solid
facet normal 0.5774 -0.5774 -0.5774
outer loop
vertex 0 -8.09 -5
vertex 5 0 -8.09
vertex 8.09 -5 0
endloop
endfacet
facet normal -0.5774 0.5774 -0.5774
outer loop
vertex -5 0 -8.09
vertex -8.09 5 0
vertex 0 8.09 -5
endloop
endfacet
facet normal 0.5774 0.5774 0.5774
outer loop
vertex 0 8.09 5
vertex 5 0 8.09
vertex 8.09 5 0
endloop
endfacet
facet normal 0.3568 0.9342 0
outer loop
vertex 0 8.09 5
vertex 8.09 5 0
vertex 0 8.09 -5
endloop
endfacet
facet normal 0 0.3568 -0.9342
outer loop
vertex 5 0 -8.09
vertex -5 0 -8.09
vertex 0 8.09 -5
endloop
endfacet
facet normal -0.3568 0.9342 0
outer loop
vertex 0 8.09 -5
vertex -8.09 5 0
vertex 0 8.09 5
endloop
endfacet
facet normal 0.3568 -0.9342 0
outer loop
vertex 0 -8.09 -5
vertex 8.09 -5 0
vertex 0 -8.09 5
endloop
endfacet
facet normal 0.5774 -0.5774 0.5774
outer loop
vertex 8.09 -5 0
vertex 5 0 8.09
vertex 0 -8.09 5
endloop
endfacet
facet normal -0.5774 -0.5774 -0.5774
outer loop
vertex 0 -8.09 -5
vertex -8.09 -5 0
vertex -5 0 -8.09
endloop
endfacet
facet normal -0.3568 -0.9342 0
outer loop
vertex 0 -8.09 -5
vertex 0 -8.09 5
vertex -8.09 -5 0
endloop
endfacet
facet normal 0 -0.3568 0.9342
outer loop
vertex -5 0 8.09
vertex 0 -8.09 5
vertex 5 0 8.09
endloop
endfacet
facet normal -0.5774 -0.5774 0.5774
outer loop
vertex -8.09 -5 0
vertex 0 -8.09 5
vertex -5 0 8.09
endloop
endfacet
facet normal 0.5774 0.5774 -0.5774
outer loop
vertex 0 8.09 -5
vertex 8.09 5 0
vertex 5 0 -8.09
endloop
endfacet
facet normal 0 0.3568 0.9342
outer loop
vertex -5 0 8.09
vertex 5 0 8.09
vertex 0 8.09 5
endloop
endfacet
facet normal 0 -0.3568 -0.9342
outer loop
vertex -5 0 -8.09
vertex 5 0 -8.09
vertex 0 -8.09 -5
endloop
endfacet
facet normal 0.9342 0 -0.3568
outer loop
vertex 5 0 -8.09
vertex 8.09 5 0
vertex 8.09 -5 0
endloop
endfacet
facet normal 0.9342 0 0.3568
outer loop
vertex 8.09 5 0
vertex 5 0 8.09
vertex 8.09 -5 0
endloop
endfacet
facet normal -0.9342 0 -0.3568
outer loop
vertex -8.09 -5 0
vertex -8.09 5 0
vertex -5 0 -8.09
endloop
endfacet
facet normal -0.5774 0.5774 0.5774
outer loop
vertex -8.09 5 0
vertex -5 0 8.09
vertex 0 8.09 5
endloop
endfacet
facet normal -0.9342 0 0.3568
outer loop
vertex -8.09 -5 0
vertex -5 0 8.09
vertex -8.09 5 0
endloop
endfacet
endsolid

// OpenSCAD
//icosahedron without external dependencies

phi=0.5*(sqrt(5)+1); // golden ratio

// create an icosahedron by intersecting 3 orthogonal golden-ratio rectangles
module icosahedron(edge_length) {
   st=0.0001;  // microscopic sheet thickness
   hull() {
       cube([edge_length*phi, edge_length, st], true);
       rotate([90,90,0]) cube([edge_length*phi, edge_length, st], true);
       rotate([90,0,90]) cube([edge_length*phi, edge_length, st], true);
   }
}

// display the 3 internal sheets alongside the icosahedron
edge=10;


icosahedron(edge);
